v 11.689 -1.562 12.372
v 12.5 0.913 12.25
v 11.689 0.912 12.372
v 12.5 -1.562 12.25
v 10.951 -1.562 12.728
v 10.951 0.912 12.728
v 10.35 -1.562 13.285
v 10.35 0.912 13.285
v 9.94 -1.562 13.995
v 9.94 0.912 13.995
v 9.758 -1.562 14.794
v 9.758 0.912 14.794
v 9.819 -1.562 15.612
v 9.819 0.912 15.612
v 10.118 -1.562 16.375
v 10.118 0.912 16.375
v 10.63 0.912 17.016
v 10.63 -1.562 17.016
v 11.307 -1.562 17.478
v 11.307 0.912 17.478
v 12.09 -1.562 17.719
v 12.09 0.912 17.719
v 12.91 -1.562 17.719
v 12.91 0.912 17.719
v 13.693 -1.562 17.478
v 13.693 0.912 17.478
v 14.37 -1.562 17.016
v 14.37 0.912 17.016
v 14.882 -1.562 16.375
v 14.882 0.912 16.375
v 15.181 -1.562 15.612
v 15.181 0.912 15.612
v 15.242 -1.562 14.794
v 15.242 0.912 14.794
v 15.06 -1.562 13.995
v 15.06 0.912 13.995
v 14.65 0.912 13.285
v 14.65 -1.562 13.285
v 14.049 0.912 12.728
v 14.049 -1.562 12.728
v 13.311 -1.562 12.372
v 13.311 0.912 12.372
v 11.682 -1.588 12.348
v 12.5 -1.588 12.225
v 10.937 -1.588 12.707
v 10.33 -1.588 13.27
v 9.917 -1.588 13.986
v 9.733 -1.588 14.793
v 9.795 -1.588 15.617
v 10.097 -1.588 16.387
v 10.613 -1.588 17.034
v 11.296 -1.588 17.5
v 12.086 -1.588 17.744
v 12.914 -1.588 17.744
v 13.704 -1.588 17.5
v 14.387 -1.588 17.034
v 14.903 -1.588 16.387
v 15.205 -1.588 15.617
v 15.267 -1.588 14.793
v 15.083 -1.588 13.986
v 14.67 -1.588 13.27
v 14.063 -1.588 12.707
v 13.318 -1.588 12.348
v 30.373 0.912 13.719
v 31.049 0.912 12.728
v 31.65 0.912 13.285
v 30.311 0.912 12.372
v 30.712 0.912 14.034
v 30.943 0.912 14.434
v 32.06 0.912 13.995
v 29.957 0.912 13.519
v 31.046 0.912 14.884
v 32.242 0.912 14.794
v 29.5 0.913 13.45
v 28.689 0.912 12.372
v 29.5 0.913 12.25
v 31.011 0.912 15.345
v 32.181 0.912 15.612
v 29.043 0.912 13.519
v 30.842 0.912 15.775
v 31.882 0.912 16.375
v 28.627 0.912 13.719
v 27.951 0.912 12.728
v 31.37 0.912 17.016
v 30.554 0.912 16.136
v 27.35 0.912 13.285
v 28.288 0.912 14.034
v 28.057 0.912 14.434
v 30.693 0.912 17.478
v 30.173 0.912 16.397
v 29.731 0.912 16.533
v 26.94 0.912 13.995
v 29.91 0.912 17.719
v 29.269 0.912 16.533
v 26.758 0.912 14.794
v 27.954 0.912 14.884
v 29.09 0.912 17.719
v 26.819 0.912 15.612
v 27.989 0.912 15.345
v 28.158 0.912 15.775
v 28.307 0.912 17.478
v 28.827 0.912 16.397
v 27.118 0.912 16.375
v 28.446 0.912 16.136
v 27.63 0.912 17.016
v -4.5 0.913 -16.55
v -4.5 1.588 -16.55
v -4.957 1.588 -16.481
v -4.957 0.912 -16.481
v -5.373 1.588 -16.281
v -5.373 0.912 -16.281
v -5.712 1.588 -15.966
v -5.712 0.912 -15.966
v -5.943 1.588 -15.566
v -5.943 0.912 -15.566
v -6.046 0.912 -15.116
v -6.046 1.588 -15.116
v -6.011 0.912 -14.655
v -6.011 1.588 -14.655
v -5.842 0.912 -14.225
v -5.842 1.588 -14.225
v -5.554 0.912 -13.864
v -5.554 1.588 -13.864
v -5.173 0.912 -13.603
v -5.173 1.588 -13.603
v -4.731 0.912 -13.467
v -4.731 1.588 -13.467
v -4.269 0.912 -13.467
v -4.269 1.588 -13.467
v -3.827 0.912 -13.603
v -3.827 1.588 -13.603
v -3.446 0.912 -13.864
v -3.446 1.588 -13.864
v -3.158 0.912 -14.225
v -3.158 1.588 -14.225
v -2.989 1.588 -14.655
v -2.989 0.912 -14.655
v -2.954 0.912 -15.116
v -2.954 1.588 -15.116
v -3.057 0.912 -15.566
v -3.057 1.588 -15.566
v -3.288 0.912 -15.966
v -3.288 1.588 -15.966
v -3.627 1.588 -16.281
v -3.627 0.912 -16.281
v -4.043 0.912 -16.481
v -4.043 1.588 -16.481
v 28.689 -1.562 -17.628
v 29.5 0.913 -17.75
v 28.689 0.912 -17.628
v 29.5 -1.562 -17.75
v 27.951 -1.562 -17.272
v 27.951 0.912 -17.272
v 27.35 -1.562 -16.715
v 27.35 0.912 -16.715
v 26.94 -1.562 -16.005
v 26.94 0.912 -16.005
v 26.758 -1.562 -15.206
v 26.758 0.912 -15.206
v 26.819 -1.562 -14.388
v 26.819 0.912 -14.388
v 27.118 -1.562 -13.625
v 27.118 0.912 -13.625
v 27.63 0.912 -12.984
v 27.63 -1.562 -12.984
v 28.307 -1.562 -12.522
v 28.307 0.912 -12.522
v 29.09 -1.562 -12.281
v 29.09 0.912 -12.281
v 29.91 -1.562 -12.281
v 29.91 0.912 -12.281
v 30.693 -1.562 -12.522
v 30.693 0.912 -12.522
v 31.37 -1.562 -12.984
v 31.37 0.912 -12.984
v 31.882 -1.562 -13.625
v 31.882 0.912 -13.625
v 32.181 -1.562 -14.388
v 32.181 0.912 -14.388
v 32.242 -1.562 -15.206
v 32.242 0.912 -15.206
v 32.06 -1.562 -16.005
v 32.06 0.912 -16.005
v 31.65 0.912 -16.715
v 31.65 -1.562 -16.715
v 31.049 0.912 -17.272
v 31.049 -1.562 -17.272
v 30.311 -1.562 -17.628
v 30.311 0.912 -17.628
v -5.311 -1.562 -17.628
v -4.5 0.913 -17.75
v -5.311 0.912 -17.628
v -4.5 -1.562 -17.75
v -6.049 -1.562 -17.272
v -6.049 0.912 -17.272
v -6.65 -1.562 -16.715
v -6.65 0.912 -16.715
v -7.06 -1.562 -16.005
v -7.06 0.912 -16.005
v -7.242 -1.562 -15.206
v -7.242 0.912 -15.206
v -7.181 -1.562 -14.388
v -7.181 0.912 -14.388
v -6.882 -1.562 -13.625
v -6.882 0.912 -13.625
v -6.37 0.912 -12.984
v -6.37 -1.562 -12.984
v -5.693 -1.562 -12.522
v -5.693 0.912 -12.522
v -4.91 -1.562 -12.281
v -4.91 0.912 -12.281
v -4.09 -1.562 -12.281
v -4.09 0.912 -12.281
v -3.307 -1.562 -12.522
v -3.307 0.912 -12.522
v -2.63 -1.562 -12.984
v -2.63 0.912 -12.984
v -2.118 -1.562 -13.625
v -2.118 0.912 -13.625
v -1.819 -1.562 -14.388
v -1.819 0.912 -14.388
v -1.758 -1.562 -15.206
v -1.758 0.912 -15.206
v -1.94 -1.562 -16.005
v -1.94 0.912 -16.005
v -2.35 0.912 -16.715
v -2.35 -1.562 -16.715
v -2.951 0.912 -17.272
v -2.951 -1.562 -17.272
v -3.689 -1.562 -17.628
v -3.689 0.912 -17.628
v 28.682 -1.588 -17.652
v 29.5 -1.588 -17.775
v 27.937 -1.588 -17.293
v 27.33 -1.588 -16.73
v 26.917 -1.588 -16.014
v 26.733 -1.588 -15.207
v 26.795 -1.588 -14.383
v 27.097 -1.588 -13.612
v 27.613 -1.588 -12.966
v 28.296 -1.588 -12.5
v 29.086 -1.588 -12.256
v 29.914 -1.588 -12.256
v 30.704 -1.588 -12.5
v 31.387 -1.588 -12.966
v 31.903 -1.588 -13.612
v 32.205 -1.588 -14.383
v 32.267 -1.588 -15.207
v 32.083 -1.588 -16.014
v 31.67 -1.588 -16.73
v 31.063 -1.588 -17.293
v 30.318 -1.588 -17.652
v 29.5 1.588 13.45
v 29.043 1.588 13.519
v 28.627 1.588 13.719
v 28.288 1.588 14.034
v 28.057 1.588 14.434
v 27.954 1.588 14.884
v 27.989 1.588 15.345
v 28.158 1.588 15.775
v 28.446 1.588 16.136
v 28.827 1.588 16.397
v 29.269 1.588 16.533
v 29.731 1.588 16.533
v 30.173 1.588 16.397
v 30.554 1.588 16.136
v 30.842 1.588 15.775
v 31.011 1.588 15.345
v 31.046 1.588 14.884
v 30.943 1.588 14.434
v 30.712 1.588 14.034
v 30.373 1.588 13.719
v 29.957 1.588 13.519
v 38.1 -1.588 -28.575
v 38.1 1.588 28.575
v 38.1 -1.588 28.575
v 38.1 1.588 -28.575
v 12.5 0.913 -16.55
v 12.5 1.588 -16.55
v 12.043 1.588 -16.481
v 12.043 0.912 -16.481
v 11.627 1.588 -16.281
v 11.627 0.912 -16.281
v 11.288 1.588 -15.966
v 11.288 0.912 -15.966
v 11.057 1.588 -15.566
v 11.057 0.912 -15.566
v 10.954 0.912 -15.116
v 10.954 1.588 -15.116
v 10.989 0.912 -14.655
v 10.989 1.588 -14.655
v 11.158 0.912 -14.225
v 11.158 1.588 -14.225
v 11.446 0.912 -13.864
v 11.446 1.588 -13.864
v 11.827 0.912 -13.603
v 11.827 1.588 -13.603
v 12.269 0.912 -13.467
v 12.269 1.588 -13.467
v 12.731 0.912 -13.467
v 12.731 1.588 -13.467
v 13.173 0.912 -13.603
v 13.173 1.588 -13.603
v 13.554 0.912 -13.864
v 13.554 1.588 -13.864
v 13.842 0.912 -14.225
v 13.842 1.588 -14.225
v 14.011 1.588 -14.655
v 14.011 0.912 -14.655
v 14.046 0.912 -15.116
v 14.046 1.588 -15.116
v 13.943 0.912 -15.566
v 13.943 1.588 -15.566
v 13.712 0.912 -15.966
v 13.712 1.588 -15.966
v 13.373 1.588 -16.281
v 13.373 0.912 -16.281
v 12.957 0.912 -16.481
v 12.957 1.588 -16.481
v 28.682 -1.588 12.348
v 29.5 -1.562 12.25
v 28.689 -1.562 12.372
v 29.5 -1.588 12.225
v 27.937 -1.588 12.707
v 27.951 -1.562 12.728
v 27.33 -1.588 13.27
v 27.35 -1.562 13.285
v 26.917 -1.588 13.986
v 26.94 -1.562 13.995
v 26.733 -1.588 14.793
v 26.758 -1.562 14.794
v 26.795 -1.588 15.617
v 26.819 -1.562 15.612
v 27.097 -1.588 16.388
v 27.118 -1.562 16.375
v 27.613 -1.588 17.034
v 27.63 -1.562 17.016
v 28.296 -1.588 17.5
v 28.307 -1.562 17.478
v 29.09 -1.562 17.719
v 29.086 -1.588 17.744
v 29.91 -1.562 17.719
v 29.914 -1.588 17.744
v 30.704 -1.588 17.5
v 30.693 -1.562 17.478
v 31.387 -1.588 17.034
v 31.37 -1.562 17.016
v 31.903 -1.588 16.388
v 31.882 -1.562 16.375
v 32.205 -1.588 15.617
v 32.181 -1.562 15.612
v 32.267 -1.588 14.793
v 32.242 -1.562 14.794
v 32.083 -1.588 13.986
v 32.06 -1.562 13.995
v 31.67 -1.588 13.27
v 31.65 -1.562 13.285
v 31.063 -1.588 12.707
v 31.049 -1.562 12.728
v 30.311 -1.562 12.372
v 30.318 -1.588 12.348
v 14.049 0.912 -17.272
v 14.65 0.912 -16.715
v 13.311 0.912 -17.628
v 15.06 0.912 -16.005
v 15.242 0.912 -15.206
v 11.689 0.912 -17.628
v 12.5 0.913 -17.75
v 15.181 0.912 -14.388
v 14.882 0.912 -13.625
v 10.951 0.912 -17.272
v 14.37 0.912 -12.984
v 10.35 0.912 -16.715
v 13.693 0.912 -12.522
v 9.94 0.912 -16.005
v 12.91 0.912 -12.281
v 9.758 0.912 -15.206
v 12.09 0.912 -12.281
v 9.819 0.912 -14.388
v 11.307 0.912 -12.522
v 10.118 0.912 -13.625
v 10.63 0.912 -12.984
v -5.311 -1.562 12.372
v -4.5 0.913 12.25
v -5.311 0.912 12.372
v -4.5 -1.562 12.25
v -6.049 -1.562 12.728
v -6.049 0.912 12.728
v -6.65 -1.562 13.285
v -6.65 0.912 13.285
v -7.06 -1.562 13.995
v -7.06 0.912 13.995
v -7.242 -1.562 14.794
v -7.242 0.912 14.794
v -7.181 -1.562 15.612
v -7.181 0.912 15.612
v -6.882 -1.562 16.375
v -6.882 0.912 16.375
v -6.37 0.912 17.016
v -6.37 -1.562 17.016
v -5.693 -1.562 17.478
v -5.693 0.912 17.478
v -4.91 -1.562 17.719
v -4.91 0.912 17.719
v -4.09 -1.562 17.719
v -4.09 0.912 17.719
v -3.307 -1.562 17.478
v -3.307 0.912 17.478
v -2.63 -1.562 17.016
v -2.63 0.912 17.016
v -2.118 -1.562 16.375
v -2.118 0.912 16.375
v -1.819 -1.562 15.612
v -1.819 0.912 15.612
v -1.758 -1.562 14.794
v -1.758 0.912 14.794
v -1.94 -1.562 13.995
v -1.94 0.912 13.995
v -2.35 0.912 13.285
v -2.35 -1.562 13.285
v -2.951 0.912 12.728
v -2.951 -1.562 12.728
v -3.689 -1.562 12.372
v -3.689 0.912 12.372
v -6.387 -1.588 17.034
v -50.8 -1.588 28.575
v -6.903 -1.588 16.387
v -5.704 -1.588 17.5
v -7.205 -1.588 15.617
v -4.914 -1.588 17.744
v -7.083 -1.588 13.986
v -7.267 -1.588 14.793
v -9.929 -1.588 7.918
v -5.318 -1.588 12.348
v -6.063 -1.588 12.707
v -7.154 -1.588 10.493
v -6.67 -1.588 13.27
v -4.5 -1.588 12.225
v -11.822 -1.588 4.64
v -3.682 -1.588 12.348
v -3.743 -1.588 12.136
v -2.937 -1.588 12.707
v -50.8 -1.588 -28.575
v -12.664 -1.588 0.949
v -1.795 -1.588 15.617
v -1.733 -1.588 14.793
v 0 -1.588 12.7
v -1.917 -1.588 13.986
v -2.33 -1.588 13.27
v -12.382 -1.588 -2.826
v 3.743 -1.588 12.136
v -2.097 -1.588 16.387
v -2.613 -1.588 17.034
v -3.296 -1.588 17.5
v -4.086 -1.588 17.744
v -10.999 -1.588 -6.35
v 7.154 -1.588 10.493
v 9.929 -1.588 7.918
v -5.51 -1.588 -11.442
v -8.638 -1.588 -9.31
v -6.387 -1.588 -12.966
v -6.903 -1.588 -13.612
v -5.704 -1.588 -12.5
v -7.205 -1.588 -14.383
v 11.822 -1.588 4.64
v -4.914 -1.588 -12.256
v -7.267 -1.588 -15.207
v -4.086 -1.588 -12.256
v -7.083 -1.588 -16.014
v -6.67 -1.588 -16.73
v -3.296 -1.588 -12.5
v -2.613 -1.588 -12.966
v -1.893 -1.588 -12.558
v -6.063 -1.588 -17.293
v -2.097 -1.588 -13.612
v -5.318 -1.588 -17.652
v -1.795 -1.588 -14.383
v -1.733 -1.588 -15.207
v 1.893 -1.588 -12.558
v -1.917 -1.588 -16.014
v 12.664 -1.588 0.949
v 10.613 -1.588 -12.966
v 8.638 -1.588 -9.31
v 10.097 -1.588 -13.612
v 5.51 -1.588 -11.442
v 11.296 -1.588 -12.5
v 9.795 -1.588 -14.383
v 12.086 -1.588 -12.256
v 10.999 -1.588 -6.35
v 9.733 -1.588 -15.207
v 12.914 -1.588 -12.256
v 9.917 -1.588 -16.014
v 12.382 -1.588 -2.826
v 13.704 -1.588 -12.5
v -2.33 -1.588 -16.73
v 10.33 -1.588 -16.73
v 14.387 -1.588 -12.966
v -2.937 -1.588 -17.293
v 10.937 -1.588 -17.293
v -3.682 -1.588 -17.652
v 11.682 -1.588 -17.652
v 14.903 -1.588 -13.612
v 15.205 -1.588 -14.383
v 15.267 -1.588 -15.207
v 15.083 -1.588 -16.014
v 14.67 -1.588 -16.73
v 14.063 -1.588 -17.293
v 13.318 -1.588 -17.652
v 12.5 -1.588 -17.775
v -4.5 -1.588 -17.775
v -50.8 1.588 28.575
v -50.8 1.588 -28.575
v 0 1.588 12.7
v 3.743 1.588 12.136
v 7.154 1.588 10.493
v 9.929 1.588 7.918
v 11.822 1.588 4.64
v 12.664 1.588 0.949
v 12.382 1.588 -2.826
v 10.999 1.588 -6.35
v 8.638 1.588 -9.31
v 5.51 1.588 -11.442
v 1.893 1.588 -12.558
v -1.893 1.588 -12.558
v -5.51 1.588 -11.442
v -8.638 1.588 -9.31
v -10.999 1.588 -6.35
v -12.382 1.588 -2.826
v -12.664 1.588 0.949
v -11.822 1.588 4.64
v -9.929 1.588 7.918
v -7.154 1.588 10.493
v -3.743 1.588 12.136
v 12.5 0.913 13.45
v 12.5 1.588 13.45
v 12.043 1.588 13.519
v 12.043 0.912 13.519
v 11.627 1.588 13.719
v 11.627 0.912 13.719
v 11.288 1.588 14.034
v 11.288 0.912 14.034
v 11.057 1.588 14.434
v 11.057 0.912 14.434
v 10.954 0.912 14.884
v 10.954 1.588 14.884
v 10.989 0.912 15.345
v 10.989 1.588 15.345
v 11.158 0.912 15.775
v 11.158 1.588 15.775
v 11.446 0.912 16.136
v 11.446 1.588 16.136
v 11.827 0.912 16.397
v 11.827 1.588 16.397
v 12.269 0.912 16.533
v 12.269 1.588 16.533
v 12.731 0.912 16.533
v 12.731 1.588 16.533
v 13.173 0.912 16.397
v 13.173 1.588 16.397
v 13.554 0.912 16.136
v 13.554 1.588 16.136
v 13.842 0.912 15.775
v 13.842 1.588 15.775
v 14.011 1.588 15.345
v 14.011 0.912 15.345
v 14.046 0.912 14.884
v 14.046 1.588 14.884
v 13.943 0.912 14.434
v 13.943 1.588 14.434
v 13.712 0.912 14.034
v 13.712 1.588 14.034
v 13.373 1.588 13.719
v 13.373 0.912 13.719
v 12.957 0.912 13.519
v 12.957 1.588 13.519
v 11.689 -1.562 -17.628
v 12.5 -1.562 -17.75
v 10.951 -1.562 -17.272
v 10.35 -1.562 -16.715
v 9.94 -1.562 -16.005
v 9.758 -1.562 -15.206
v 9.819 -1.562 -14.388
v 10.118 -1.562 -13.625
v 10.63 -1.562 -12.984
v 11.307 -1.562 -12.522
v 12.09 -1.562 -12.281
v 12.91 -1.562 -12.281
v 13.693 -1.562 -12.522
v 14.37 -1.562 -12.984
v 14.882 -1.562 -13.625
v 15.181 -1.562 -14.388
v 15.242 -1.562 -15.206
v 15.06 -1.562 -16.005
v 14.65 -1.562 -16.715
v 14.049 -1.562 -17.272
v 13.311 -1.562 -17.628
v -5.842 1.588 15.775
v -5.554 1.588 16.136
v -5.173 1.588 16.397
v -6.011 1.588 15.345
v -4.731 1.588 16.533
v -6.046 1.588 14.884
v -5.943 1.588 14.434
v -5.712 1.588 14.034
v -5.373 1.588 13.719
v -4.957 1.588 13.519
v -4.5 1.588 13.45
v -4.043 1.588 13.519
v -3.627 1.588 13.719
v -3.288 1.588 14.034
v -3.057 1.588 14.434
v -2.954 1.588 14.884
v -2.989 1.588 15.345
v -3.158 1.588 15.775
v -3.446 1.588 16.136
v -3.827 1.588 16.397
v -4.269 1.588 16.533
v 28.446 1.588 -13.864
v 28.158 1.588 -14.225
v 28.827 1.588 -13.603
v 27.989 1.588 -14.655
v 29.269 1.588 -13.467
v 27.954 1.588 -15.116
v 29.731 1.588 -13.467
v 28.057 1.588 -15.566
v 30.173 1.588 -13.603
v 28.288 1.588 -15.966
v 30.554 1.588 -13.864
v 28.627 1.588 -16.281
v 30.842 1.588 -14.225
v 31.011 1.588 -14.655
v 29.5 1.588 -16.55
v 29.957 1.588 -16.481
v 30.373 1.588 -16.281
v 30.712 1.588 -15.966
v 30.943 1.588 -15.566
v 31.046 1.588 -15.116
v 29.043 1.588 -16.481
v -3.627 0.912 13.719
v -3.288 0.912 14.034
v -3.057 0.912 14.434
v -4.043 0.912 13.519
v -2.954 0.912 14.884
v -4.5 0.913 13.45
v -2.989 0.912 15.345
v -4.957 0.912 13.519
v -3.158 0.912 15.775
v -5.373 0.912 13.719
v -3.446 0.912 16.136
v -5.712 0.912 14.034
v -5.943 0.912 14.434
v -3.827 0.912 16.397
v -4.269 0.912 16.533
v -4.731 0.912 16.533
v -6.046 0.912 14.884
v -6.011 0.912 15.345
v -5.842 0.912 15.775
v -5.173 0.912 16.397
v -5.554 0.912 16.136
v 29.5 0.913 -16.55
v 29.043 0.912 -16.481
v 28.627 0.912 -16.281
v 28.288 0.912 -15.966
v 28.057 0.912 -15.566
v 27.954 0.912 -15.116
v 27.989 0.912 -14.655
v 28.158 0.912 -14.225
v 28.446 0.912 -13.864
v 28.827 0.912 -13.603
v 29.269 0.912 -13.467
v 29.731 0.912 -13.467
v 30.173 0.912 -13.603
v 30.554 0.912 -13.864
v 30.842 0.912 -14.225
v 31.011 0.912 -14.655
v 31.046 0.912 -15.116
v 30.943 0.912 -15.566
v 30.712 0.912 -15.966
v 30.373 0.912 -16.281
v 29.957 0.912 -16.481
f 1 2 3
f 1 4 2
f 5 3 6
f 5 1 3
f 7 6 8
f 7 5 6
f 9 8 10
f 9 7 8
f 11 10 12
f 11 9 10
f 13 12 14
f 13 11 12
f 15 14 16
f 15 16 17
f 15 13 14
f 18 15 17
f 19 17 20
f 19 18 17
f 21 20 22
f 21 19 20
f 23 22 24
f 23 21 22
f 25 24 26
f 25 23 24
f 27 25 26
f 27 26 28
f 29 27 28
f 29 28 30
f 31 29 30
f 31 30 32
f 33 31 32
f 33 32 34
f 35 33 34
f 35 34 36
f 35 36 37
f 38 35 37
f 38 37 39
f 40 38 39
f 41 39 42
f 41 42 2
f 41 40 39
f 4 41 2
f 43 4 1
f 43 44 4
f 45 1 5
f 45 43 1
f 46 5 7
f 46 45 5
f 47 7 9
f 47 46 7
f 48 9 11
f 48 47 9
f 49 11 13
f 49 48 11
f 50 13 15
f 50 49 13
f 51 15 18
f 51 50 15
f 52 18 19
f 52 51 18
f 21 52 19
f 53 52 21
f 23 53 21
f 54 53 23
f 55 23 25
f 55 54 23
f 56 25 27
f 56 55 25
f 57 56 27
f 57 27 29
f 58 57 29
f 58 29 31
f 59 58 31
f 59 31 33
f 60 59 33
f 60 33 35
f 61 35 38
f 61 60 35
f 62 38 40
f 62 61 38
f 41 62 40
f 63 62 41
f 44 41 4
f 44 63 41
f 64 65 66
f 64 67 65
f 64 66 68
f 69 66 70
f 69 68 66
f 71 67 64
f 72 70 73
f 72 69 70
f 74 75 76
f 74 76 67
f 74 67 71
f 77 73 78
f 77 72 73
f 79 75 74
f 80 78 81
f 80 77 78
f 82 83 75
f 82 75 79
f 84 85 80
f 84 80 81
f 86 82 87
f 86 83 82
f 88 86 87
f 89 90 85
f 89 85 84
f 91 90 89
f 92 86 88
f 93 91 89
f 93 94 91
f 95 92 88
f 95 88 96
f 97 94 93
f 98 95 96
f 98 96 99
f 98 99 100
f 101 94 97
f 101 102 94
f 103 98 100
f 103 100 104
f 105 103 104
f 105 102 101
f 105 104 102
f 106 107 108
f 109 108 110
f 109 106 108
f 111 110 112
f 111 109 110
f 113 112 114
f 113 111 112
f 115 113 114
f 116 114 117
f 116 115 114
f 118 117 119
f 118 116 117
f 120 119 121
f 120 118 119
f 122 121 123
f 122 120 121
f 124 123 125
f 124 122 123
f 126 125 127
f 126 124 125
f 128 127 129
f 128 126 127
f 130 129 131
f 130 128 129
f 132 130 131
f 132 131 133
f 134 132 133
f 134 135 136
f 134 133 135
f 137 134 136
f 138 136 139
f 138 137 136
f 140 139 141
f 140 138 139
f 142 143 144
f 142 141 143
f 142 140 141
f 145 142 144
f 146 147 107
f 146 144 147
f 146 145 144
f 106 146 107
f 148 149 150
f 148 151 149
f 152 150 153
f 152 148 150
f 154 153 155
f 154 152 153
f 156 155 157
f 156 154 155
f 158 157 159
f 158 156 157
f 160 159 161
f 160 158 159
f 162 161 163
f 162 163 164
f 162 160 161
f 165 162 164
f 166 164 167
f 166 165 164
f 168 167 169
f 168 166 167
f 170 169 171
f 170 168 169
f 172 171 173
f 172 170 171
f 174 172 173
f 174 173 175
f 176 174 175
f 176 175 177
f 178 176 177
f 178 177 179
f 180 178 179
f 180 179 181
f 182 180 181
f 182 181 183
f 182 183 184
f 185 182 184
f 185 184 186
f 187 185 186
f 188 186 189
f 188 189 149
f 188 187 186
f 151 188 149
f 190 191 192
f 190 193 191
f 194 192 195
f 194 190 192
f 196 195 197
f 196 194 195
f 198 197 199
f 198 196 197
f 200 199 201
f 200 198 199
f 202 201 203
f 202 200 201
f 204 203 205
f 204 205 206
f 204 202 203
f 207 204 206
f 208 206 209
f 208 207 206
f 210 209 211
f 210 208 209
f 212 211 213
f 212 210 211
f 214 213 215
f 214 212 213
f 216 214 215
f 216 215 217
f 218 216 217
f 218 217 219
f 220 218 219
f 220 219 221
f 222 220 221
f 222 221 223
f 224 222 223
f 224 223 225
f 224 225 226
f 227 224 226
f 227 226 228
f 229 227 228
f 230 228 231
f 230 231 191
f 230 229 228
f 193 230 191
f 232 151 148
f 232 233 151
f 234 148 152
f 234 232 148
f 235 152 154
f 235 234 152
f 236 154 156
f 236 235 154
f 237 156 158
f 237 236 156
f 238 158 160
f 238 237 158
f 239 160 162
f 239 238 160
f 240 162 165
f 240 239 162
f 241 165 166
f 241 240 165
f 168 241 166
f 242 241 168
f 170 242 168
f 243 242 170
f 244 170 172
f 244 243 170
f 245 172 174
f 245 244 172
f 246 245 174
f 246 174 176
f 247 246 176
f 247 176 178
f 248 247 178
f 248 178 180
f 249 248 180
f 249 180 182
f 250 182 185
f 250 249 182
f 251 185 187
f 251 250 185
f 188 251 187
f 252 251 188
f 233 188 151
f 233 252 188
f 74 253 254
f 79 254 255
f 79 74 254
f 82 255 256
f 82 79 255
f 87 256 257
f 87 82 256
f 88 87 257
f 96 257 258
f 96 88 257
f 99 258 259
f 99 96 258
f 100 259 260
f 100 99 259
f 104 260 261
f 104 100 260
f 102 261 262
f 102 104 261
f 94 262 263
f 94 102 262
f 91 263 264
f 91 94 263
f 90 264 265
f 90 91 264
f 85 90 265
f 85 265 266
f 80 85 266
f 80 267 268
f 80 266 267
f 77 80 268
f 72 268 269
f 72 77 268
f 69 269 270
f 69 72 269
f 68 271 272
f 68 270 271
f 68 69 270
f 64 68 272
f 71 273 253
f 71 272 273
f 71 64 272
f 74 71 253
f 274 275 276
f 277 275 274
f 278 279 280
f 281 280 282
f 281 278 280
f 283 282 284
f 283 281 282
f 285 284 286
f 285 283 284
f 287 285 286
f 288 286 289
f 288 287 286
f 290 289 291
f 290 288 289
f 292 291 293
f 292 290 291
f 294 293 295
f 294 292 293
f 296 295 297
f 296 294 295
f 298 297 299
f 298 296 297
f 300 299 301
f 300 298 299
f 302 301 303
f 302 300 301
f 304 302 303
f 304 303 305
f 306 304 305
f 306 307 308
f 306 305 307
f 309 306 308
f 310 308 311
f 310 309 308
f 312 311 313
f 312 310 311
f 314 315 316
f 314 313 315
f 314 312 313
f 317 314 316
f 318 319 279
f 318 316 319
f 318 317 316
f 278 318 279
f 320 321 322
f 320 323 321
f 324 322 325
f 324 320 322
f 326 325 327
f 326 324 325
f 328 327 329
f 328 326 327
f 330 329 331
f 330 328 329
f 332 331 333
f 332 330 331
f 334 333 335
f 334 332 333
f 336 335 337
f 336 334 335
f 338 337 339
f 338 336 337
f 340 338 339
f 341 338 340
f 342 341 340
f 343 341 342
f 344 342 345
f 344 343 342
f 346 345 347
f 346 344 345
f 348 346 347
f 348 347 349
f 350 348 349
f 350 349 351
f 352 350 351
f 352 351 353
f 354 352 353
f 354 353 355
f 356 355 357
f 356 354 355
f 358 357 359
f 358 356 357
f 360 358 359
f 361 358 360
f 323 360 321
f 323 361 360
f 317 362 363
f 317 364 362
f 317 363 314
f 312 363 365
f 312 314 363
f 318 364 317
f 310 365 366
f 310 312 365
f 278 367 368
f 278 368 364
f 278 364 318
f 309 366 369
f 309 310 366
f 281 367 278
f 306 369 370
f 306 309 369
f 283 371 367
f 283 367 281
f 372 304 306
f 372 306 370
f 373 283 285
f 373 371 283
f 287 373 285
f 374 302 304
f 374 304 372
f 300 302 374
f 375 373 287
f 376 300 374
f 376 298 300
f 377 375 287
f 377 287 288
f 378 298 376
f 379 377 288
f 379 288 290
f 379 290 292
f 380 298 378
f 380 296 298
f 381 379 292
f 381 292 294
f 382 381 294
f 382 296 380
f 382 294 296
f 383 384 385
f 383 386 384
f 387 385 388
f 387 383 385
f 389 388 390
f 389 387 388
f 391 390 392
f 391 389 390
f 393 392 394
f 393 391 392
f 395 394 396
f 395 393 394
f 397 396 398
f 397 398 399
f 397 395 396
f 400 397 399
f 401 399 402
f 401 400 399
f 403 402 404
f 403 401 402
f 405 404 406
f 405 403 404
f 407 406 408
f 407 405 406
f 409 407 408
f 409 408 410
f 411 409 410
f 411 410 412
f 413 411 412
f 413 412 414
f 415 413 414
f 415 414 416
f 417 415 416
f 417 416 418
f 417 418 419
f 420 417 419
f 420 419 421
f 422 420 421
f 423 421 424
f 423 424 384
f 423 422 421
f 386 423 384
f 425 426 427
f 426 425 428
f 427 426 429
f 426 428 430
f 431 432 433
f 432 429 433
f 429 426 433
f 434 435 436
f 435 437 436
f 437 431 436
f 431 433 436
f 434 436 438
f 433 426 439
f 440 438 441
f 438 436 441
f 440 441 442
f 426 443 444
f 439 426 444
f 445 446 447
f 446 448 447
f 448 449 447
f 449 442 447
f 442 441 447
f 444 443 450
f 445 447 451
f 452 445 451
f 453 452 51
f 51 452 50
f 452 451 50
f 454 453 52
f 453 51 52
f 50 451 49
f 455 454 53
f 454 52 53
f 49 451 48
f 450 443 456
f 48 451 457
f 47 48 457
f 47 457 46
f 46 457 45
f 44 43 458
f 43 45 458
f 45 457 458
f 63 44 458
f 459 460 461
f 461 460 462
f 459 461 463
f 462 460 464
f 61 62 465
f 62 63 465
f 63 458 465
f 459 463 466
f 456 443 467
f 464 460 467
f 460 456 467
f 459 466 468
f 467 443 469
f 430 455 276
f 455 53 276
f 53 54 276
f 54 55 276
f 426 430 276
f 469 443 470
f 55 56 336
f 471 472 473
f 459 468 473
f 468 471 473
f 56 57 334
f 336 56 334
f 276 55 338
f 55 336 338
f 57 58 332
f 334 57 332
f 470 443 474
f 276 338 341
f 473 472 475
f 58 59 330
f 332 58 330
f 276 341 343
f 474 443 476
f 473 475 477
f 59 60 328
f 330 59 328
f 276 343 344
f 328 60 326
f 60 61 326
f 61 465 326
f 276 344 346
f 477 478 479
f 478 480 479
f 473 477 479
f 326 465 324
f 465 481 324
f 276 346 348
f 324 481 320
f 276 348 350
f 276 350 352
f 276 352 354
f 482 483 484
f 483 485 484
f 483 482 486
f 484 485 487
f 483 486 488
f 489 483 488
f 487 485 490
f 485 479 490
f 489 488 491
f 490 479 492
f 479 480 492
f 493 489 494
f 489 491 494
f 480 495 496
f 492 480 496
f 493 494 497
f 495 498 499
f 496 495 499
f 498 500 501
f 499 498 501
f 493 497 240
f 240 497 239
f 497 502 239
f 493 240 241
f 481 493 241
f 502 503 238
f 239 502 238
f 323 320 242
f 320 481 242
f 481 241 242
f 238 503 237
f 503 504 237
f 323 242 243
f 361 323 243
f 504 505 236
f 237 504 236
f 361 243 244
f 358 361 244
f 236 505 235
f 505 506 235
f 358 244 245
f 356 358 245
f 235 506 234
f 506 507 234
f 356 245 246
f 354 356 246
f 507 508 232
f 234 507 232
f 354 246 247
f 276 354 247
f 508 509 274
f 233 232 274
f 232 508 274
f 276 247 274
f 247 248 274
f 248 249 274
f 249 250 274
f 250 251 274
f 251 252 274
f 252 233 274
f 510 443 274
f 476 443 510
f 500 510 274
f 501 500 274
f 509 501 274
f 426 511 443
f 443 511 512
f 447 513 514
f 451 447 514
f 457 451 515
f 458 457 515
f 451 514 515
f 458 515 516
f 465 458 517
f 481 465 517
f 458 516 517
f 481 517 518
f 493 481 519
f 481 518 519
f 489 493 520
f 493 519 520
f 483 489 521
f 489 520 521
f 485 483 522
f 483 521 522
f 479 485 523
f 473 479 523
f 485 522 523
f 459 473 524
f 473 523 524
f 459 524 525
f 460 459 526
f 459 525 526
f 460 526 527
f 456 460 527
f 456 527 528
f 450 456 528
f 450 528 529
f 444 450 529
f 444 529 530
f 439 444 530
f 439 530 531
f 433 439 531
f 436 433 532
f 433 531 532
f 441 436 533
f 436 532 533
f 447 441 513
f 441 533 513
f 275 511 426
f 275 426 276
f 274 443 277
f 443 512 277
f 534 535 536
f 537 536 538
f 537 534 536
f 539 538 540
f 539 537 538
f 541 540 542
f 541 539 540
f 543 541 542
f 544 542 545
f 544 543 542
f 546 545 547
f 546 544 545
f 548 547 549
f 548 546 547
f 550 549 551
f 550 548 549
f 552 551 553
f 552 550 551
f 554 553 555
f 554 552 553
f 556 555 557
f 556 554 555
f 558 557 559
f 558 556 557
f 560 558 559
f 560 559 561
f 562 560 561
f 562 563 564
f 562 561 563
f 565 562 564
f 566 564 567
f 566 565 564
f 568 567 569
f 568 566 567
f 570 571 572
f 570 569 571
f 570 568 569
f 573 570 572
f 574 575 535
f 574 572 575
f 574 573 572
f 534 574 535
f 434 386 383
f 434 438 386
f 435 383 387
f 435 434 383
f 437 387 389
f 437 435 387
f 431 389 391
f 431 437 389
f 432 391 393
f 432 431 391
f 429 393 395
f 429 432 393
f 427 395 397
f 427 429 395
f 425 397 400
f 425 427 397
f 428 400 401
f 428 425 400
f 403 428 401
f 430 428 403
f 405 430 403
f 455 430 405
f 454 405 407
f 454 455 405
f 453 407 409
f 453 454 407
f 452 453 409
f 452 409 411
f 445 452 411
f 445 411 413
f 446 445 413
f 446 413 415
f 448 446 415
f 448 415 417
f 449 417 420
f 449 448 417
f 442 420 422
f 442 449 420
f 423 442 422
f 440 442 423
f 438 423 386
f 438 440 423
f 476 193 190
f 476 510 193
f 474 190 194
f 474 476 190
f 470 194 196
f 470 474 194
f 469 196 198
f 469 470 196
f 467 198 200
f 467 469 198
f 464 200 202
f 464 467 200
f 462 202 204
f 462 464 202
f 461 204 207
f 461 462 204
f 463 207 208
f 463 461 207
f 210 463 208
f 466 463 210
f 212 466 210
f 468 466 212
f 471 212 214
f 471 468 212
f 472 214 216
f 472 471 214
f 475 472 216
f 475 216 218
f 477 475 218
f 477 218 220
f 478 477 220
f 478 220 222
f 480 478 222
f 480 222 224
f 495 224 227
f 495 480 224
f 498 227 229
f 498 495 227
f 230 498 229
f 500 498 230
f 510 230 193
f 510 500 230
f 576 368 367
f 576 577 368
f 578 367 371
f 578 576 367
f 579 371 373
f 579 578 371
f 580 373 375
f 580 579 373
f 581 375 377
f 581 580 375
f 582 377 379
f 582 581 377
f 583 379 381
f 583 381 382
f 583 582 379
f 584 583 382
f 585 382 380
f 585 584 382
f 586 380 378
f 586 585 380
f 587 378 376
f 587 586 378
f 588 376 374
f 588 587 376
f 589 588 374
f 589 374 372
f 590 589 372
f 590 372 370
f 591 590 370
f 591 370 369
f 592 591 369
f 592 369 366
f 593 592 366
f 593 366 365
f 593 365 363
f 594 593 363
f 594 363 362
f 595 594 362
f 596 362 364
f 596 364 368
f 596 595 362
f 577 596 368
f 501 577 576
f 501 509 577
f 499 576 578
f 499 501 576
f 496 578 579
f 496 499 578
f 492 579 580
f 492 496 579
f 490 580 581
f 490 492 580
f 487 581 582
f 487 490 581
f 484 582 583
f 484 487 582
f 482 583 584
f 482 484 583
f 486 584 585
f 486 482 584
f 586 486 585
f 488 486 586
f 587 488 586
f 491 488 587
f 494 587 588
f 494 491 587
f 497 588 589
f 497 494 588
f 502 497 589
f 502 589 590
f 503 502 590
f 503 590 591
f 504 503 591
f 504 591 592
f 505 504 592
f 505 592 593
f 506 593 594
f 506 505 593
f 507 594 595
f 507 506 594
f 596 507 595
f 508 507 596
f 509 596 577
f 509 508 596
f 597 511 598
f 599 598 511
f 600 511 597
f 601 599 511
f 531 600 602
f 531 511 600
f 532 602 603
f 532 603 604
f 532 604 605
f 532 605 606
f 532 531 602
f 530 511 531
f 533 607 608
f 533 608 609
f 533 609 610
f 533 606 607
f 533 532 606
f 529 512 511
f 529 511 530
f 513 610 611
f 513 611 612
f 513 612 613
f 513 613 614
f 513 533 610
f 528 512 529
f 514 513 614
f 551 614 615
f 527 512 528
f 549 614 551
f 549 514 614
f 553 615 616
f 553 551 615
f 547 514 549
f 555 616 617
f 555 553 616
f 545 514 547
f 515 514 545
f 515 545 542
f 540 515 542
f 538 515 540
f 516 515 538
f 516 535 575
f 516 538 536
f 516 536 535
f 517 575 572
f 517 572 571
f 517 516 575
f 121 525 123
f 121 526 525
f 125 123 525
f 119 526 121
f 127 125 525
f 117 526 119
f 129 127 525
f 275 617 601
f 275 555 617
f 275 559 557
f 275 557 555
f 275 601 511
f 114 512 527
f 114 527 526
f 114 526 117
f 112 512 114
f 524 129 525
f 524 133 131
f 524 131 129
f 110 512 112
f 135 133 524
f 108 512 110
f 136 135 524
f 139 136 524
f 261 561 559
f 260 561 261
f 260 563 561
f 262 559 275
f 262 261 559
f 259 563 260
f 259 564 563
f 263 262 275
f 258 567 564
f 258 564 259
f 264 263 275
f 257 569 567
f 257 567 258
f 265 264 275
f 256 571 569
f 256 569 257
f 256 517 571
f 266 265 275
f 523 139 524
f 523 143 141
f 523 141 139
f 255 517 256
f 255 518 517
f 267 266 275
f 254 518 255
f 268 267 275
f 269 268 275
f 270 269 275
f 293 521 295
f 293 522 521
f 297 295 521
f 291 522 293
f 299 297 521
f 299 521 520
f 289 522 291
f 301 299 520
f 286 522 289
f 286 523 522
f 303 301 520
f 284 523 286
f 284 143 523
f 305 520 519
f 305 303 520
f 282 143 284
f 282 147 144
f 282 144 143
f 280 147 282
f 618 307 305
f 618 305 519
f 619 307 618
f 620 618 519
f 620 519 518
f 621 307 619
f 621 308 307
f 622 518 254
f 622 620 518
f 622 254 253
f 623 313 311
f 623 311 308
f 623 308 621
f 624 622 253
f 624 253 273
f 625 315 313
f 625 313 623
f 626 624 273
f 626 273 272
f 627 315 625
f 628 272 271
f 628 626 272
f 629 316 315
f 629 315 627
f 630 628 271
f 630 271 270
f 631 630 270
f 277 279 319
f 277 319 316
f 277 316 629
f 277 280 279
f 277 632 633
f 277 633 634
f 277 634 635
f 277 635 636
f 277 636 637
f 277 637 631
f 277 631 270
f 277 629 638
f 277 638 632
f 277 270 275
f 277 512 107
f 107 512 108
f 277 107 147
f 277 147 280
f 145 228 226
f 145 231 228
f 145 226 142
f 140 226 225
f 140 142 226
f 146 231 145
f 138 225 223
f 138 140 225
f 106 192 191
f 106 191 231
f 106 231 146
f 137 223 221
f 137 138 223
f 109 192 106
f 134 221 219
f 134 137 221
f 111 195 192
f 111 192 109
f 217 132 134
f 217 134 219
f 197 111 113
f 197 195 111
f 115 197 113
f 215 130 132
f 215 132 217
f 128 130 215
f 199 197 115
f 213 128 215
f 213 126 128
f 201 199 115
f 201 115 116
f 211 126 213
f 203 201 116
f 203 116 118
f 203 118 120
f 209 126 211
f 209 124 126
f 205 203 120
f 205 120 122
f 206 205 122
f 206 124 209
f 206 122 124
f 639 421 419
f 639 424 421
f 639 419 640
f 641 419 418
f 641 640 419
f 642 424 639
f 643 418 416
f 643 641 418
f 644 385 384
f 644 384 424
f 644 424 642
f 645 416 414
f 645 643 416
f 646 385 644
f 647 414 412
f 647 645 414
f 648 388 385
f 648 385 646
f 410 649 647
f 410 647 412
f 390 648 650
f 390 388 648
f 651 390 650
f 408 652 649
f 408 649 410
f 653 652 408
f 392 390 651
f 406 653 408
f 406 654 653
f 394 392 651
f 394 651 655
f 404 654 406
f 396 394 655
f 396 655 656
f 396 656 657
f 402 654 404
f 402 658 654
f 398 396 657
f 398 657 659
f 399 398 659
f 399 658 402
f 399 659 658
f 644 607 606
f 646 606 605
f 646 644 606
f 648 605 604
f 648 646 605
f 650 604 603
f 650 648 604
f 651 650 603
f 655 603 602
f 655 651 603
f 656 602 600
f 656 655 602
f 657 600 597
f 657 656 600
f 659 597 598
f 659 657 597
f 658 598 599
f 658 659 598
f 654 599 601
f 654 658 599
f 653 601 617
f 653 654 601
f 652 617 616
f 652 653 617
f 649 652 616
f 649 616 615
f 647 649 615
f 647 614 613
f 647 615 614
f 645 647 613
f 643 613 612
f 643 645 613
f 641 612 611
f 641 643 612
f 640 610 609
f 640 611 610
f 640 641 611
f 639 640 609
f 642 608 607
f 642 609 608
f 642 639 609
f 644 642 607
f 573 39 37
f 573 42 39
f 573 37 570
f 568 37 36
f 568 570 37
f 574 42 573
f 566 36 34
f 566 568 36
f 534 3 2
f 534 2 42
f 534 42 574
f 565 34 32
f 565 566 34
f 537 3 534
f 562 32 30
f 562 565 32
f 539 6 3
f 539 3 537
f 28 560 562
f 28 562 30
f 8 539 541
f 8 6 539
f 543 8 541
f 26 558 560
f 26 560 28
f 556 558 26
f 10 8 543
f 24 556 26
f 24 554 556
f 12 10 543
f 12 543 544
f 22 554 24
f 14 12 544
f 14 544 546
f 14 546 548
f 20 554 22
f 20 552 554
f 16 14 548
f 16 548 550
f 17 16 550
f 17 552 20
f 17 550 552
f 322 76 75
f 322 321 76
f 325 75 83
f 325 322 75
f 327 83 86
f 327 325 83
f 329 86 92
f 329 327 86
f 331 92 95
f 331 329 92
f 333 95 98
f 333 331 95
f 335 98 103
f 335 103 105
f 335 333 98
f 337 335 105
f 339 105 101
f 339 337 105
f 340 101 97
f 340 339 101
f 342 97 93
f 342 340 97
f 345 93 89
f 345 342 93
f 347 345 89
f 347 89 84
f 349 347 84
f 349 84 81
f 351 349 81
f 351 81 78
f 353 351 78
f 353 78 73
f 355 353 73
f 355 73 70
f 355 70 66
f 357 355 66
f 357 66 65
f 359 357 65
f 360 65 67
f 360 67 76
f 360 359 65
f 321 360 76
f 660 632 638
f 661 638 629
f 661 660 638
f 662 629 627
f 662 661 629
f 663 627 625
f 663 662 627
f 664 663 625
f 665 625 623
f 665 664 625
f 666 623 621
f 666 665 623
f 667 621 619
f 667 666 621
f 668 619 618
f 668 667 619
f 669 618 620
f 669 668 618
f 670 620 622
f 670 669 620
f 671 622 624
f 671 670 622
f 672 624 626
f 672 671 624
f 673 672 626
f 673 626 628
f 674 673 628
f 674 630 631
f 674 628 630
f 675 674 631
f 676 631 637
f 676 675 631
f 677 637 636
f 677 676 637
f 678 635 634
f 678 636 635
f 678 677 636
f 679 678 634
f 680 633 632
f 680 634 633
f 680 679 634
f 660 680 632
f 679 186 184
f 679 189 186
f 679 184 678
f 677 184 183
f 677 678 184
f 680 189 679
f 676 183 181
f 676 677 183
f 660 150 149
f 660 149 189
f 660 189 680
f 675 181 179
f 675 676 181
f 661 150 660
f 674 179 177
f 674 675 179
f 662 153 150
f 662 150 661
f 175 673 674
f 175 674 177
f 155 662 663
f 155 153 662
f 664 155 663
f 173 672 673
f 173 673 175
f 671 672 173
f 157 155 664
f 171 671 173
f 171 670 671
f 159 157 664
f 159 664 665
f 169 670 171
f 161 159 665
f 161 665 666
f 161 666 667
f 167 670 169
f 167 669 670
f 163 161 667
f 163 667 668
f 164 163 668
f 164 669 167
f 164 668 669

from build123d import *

# Parameters (mm, degrees)
SKETCH1_W                       = 88.9
SKETCH1_H                       = 57.15
BOSS_EXTRUDE1_DEPTH             = 1.5875
SKETCH2_R                       = 12.7
CUT_EXTRUDE1_DEPTH              = 3.175
CBORE_FOR_M2_5_SHCS1_AT_2_COUNT = 2
CBORE_FOR_M2_5_SHCS1_AT_2_PITCH = 17
CBORE_FOR_M2_5_SHCS1_AT_3_COUNT = 2
CBORE_FOR_M2_5_SHCS1_AT_3_PITCH = 34
CBORE_FOR_M2_5_SHCS1_AT_4_COUNT = 2
CBORE_FOR_M2_5_SHCS1_AT_4_PITCH = 30
CBORE_FOR_M2_5_SHCS1_AT_5_COUNT = 2
CBORE_FOR_M2_5_SHCS1_AT_5_PITCH = 34.481879299
CBORE_FOR_M2_5_SHCS1_AT_6_COUNT = 2
CBORE_FOR_M2_5_SHCS1_AT_6_PITCH = 45.343136195


with BuildPart() as part:
    # Sketch1 → Boss-Extrude1 (new, symmetric)
    with BuildSketch(Plane(origin=(0, 0, 0), x_dir=(1, 0, 0), z_dir=(0, 1, 0))):
        with Locations((-6.35, 0)):
            Rectangle(SKETCH1_W, SKETCH1_H)
    extrude(amount=BOSS_EXTRUDE1_DEPTH, both=True)

    # Sketch2 → Cut-Extrude1 (cut)
    with BuildSketch(Plane(origin=(0, 1.5875, 0), x_dir=(1, 0, 0), z_dir=(0, 1, 0))):
        with Locations(Location((0, 0, 0), (0, 0, 270))):
            Circle(SKETCH2_R)
    extrude(amount=-CUT_EXTRUDE1_DEPTH, mode=Mode.SUBTRACT)

    # Sketch10 → CBORE for M2.5 SHCS1 (revolve, cut)
    with BuildSketch(Plane(origin=(29.5, -1.5875, -15), x_dir=(0, 0, -1), z_dir=(1, 0, 0))):
        Polygon((0, 0), (0, 153.331333959), (1.55, 152.4), (1.55, 2.5), (2.75, 2.5), (2.75, 0.025), (2.775, 0), align=None)
    cbore_for_m2_5_shcs1 = revolve(axis=Axis((29.5, -7.9375, -15), (0, 1, 0)), mode=Mode.SUBTRACT)

    # CBORE for M2.5 SHCS1 at 2: CBORE for M2.5 SHCS1 ×2
    with Locations(*[(-i * CBORE_FOR_M2_5_SHCS1_AT_2_PITCH, 0, 0) for i in range(1, CBORE_FOR_M2_5_SHCS1_AT_2_COUNT)]):
        add(cbore_for_m2_5_shcs1, mode=Mode.SUBTRACT)

    # CBORE for M2.5 SHCS1 at 3: CBORE for M2.5 SHCS1 ×2
    with Locations(*[(-i * CBORE_FOR_M2_5_SHCS1_AT_3_PITCH, 0, 0) for i in range(1, CBORE_FOR_M2_5_SHCS1_AT_3_COUNT)]):
        add(cbore_for_m2_5_shcs1, mode=Mode.SUBTRACT)

    # CBORE for M2.5 SHCS1 at 4: CBORE for M2.5 SHCS1 ×2
    with Locations(*[(0, 0, i * CBORE_FOR_M2_5_SHCS1_AT_4_PITCH) for i in range(1, CBORE_FOR_M2_5_SHCS1_AT_4_COUNT)]):
        add(cbore_for_m2_5_shcs1, mode=Mode.SUBTRACT)

    # CBORE for M2.5 SHCS1 at 5: CBORE for M2.5 SHCS1 ×2
    with Locations(*[Vector(-0.49301257198088044, 0, 0.8700221858486122) * (i * CBORE_FOR_M2_5_SHCS1_AT_5_PITCH) for i in range(1, CBORE_FOR_M2_5_SHCS1_AT_5_COUNT)]):
        add(cbore_for_m2_5_shcs1, mode=Mode.SUBTRACT)

    # CBORE for M2.5 SHCS1 at 6: CBORE for M2.5 SHCS1 ×2
    with Locations(*[Vector(-0.7498378553650926, 0, 0.6616216370868463) * (i * CBORE_FOR_M2_5_SHCS1_AT_6_PITCH) for i in range(1, CBORE_FOR_M2_5_SHCS1_AT_6_COUNT)]):
        add(cbore_for_m2_5_shcs1, mode=Mode.SUBTRACT)


solid = part.part
